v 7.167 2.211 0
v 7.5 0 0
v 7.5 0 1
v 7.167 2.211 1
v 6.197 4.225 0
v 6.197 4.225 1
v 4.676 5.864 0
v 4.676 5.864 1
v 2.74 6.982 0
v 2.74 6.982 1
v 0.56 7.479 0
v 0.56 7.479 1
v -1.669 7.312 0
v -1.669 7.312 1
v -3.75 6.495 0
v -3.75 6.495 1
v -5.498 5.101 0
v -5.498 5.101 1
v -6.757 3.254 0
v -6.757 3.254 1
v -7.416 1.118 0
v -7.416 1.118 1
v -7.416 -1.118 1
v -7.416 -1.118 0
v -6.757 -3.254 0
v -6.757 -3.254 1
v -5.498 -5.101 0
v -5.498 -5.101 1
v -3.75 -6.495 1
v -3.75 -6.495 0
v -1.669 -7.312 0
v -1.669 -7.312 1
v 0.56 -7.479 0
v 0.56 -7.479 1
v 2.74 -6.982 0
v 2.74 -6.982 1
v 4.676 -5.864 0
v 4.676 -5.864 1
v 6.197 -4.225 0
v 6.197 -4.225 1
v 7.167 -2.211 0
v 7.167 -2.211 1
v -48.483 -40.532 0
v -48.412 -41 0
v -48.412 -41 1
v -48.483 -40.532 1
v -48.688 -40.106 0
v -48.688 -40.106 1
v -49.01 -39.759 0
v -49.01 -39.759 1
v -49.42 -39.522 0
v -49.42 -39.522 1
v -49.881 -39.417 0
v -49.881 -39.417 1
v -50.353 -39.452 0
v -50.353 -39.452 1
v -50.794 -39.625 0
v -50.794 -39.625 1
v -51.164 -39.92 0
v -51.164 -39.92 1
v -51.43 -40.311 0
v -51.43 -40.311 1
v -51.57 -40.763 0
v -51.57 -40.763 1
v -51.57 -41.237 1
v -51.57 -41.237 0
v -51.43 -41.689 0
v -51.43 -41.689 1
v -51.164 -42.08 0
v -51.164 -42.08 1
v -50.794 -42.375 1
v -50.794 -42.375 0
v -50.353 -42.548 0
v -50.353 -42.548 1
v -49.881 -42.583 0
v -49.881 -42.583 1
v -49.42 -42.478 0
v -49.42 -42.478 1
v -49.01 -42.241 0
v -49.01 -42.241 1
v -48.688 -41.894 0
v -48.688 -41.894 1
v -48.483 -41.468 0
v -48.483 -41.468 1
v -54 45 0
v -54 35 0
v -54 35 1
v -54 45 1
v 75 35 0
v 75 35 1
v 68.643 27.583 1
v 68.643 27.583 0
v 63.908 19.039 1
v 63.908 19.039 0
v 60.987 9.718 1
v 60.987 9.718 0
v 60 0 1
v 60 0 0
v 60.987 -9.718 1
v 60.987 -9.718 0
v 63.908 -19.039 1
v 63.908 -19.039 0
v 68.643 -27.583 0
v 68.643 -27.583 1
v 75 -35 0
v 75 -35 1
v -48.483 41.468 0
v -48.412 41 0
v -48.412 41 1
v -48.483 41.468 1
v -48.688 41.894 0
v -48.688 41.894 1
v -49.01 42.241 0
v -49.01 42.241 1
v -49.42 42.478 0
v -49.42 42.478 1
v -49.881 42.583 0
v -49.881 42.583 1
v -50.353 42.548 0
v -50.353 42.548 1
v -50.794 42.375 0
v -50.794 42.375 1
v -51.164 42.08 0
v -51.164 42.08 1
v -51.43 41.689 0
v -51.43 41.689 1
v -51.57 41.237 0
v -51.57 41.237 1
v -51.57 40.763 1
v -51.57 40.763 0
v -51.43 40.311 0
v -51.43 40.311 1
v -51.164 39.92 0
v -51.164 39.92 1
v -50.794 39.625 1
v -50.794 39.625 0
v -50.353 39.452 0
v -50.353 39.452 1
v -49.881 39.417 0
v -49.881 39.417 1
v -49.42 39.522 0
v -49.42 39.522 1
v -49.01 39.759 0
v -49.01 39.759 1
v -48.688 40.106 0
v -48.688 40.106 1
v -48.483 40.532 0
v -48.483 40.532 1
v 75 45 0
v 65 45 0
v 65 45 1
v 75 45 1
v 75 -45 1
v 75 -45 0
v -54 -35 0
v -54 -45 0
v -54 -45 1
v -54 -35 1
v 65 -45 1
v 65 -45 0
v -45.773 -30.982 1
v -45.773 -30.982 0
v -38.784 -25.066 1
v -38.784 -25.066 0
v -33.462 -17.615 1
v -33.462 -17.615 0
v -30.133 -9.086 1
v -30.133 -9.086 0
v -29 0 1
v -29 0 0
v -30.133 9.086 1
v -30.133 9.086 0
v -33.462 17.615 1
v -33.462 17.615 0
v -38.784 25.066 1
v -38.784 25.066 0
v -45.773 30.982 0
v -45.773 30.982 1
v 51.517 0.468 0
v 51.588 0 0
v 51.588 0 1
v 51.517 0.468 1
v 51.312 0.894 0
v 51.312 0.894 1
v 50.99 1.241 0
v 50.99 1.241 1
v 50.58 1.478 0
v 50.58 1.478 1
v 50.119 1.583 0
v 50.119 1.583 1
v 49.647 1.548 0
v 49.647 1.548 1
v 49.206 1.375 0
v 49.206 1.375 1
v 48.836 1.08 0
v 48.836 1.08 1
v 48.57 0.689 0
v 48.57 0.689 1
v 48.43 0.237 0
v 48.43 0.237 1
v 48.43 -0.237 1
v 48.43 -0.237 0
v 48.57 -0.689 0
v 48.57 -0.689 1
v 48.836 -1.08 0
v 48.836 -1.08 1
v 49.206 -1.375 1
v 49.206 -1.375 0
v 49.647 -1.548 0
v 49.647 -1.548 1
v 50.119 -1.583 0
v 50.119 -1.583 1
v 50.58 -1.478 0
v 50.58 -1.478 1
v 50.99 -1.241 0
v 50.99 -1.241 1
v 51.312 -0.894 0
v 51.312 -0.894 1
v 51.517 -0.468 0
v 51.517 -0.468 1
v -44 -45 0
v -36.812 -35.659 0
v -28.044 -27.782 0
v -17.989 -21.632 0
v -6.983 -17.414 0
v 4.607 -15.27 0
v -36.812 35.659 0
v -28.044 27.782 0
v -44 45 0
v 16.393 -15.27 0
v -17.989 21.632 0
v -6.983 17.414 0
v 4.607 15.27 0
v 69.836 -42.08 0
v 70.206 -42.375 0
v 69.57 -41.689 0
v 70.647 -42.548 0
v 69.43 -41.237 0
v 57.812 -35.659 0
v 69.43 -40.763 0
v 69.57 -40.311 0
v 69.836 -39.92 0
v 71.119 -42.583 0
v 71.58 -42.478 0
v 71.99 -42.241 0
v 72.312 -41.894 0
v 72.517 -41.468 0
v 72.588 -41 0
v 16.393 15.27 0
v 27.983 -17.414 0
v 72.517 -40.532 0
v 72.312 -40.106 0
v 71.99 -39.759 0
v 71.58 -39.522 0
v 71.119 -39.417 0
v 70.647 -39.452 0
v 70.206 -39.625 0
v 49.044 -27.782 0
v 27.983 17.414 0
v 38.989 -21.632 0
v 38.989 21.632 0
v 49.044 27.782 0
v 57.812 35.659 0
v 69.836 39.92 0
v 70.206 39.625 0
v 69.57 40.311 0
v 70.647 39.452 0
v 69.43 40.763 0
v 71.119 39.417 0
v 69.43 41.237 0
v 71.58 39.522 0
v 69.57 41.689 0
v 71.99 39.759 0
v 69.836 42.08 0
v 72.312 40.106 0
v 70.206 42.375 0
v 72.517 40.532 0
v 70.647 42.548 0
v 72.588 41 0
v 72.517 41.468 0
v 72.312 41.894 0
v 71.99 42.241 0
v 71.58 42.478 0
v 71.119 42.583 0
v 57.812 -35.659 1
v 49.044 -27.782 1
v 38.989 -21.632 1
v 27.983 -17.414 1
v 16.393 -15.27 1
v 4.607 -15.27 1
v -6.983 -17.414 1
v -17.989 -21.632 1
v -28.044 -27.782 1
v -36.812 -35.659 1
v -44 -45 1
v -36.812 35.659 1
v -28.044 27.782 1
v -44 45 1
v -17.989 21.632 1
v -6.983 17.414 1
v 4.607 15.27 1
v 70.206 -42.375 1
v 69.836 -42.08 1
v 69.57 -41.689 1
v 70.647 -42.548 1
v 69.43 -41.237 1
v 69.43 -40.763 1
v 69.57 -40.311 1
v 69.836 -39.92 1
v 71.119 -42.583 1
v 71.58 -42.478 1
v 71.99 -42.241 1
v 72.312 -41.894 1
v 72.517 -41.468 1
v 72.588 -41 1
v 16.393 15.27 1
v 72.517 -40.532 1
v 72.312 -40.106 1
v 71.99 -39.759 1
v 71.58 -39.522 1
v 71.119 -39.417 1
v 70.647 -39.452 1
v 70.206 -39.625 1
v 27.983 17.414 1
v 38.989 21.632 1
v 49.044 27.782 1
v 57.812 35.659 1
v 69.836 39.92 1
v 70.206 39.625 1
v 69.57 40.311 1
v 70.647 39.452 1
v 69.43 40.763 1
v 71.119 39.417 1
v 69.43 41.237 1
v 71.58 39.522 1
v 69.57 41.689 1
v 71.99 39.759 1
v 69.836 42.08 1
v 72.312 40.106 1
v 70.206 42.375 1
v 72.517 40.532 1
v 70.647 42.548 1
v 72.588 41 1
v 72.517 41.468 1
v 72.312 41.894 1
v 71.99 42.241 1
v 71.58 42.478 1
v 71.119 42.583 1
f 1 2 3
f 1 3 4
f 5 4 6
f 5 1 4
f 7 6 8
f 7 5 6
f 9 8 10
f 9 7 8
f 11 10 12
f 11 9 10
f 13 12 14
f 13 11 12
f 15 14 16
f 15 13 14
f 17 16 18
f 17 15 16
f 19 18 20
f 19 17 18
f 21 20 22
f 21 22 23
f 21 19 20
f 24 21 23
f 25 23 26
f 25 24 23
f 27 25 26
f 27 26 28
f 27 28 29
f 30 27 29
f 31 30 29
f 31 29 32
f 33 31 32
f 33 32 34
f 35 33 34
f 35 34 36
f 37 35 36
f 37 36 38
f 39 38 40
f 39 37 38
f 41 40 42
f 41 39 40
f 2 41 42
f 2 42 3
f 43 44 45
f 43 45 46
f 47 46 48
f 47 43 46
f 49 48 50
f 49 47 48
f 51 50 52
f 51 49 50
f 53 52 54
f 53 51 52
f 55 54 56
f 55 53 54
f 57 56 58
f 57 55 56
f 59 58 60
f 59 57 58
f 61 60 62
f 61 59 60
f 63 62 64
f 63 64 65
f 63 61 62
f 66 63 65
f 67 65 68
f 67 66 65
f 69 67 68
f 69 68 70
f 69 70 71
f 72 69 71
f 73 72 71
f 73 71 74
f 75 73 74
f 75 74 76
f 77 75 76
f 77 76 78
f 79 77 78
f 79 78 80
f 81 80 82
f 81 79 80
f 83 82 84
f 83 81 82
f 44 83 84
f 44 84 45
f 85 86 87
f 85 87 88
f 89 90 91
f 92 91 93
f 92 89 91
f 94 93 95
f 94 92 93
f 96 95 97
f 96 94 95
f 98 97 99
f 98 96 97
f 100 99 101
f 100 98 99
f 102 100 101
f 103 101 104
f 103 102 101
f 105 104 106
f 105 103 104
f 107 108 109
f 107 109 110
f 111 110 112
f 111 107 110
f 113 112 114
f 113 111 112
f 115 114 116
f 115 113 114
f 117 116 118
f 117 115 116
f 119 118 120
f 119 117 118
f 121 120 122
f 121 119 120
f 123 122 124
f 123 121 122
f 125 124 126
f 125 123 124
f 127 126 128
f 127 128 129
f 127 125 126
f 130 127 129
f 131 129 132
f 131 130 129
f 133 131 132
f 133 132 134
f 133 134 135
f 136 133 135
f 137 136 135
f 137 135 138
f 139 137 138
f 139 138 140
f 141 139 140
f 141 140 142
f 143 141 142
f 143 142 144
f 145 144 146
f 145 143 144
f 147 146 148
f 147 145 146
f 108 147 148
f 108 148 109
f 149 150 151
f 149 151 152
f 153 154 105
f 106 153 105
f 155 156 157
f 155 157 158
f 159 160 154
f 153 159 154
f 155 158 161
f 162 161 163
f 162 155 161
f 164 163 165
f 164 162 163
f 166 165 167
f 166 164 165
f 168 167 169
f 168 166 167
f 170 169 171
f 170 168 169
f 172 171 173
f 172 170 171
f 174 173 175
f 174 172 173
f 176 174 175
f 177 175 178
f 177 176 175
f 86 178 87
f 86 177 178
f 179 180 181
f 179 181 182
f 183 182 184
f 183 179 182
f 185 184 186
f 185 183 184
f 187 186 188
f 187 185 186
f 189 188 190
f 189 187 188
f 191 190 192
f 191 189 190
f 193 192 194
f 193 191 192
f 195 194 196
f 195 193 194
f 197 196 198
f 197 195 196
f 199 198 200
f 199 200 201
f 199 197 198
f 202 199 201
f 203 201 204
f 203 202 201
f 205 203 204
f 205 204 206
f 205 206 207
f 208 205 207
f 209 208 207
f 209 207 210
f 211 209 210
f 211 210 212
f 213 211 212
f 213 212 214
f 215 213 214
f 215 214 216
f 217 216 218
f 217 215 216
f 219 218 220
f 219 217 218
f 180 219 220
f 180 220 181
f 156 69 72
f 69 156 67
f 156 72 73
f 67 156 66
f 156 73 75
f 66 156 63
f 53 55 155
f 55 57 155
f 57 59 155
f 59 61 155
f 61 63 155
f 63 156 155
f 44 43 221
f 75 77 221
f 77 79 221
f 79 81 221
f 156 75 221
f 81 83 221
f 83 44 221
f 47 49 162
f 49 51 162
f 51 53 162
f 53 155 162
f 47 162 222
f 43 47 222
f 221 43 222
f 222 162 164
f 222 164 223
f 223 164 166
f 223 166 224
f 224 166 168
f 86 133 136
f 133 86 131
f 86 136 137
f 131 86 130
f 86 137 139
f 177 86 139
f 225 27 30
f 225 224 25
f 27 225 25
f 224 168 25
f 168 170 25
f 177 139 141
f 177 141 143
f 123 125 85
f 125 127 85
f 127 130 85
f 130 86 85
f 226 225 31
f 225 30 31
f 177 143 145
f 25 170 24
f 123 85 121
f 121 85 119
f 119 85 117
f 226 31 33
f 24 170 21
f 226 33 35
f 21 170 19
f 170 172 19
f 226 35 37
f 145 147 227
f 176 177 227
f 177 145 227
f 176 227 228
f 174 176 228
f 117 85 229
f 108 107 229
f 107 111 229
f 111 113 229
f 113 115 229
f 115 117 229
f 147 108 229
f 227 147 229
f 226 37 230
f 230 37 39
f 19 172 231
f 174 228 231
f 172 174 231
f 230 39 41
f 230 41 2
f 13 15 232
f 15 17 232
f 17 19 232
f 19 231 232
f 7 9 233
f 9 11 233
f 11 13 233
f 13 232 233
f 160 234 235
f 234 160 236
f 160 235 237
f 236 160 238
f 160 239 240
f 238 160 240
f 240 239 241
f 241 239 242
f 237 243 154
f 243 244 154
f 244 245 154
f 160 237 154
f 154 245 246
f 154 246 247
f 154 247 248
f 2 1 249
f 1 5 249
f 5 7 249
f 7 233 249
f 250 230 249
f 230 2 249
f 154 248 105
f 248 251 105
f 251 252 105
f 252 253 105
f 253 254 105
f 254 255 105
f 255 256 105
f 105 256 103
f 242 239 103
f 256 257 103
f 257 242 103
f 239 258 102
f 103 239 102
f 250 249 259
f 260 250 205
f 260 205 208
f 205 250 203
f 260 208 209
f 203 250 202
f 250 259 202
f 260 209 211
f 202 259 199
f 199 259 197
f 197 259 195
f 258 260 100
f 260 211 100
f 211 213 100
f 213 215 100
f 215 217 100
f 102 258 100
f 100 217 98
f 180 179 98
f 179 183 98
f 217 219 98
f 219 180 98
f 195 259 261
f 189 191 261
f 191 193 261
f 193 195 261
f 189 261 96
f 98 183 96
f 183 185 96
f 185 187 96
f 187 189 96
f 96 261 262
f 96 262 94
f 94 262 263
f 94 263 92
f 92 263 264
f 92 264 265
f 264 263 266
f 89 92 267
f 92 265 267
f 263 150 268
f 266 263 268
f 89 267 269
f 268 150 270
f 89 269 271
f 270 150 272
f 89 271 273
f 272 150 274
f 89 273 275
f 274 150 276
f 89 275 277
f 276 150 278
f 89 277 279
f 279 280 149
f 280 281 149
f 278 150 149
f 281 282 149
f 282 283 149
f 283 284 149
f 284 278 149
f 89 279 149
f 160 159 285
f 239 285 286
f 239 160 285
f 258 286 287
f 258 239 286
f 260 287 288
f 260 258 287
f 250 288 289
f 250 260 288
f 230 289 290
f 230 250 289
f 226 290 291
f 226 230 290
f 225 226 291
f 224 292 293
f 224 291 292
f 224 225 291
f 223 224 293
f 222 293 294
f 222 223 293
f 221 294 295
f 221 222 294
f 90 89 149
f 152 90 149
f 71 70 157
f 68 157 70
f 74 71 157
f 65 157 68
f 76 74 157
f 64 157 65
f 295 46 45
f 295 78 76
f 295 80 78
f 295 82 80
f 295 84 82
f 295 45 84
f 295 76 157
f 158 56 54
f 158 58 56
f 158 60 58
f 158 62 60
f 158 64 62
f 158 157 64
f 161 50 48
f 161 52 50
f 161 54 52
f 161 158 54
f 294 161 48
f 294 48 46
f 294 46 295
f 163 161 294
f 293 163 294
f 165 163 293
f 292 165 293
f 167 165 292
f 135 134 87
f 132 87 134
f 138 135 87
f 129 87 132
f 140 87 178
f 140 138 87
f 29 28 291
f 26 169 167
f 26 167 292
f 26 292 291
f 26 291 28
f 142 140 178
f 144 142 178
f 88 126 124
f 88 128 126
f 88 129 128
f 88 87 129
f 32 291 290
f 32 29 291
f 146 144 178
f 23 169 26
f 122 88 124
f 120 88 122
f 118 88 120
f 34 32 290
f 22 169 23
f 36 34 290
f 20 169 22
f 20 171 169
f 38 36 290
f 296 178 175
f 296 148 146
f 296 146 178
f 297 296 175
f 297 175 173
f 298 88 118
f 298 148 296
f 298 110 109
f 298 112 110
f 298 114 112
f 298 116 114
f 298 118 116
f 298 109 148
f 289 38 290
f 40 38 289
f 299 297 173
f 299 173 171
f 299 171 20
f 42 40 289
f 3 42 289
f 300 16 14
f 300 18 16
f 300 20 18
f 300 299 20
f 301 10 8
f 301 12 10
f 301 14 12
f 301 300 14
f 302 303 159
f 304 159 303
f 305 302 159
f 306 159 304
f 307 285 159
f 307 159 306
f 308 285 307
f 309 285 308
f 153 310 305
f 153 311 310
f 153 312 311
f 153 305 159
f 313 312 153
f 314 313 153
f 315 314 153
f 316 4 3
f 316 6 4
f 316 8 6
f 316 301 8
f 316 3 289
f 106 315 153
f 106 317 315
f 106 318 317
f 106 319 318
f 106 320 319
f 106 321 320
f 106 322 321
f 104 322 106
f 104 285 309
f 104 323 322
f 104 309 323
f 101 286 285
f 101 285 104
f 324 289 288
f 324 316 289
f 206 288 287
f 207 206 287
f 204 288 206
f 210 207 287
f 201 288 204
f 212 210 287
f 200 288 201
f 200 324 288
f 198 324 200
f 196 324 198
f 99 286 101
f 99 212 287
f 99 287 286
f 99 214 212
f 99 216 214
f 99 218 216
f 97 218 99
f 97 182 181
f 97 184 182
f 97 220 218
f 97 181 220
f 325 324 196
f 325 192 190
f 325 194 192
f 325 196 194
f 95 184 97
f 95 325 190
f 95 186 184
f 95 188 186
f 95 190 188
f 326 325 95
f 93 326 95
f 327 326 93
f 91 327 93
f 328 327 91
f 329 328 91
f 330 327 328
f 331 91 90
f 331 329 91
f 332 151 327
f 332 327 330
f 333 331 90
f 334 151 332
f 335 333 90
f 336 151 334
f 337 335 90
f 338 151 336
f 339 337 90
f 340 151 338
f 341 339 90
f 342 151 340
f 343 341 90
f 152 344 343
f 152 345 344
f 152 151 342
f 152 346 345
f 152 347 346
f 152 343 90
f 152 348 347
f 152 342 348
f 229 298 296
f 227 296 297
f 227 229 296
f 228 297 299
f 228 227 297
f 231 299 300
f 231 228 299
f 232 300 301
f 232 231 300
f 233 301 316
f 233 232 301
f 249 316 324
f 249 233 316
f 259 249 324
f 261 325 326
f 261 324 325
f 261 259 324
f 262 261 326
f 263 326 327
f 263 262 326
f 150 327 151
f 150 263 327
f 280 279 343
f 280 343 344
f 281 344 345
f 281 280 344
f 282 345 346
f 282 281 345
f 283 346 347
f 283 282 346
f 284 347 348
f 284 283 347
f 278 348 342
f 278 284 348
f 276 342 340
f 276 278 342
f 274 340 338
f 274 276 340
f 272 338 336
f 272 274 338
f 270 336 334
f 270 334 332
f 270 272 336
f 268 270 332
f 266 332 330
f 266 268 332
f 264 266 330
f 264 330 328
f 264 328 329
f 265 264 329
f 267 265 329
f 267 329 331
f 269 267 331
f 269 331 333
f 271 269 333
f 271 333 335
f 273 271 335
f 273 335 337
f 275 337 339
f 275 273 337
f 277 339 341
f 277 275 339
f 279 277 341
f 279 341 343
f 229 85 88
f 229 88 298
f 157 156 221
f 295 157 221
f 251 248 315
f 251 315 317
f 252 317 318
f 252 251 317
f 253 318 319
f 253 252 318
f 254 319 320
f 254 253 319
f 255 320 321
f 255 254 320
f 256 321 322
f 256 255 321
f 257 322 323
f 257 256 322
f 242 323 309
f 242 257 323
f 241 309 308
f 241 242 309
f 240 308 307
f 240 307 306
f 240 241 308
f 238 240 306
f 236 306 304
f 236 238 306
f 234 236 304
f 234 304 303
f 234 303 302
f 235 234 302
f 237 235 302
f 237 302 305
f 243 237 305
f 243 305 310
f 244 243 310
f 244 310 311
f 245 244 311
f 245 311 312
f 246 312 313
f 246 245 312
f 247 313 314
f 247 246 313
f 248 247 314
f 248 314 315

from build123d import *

# Parameters (mm, degrees)
F0_W     = 150
F0_H     = 90
F0_R     = 1.5875
F0_R_2   = 7.5
F1_DEPTH = 1
F2_W     = 21
F2_H     = 90
F3_DEPTH = 1.001
F5_DEPTH = 25


with BuildPart() as f1:
    # F0 (on Top) → F1 (new body)
    with BuildSketch(Plane.XY):
        Rectangle(F0_W, F0_H)
        with Locations((-50, -41)):
            Circle(F0_R, mode=Mode.SUBTRACT)
        with Locations((71, -41)):
            Circle(F0_R, mode=Mode.SUBTRACT)
        with Locations((-50, 41)):
            Circle(F0_R, mode=Mode.SUBTRACT)
        Circle(F0_R_2, mode=Mode.SUBTRACT)
        with Locations((50, 0)):
            Circle(F0_R, mode=Mode.SUBTRACT)
        with Locations((71, 41)):
            Circle(F0_R, mode=Mode.SUBTRACT)
    extrude(amount=F1_DEPTH)

    # F2 (on Top) → F3 (cut, through all)
    with BuildSketch(Plane.XY):
        with Locations((-64.5, 0)):
            Rectangle(F2_W, F2_H)
    extrude(amount=F3_DEPTH, mode=Mode.SUBTRACT)

    # F4 (on Top) → F5 (cut)
    with BuildSketch(Plane.XY):
        with BuildLine():
            ThreePointArc((-44, 45), (10.5, 15), (65, 45))
            Line((65, 45), (-44, 45))
        make_face()
        with BuildLine():
            Line((-54, 35), (-54, -35))
            ThreePointArc((-54, -35), (-29, 0), (-54, 35))
        make_face()
        with BuildLine():
            Line((-44, -45), (65, -45))
            ThreePointArc((65, -45), (10.5, -15), (-44, -45))
        make_face()
        with BuildLine():
            Line((75, -35), (75, 35))
            ThreePointArc((75, 35), (60, 0), (75, -35))
        make_face()
    extrude(amount=F5_DEPTH, mode=Mode.SUBTRACT)


solid = f1.part
